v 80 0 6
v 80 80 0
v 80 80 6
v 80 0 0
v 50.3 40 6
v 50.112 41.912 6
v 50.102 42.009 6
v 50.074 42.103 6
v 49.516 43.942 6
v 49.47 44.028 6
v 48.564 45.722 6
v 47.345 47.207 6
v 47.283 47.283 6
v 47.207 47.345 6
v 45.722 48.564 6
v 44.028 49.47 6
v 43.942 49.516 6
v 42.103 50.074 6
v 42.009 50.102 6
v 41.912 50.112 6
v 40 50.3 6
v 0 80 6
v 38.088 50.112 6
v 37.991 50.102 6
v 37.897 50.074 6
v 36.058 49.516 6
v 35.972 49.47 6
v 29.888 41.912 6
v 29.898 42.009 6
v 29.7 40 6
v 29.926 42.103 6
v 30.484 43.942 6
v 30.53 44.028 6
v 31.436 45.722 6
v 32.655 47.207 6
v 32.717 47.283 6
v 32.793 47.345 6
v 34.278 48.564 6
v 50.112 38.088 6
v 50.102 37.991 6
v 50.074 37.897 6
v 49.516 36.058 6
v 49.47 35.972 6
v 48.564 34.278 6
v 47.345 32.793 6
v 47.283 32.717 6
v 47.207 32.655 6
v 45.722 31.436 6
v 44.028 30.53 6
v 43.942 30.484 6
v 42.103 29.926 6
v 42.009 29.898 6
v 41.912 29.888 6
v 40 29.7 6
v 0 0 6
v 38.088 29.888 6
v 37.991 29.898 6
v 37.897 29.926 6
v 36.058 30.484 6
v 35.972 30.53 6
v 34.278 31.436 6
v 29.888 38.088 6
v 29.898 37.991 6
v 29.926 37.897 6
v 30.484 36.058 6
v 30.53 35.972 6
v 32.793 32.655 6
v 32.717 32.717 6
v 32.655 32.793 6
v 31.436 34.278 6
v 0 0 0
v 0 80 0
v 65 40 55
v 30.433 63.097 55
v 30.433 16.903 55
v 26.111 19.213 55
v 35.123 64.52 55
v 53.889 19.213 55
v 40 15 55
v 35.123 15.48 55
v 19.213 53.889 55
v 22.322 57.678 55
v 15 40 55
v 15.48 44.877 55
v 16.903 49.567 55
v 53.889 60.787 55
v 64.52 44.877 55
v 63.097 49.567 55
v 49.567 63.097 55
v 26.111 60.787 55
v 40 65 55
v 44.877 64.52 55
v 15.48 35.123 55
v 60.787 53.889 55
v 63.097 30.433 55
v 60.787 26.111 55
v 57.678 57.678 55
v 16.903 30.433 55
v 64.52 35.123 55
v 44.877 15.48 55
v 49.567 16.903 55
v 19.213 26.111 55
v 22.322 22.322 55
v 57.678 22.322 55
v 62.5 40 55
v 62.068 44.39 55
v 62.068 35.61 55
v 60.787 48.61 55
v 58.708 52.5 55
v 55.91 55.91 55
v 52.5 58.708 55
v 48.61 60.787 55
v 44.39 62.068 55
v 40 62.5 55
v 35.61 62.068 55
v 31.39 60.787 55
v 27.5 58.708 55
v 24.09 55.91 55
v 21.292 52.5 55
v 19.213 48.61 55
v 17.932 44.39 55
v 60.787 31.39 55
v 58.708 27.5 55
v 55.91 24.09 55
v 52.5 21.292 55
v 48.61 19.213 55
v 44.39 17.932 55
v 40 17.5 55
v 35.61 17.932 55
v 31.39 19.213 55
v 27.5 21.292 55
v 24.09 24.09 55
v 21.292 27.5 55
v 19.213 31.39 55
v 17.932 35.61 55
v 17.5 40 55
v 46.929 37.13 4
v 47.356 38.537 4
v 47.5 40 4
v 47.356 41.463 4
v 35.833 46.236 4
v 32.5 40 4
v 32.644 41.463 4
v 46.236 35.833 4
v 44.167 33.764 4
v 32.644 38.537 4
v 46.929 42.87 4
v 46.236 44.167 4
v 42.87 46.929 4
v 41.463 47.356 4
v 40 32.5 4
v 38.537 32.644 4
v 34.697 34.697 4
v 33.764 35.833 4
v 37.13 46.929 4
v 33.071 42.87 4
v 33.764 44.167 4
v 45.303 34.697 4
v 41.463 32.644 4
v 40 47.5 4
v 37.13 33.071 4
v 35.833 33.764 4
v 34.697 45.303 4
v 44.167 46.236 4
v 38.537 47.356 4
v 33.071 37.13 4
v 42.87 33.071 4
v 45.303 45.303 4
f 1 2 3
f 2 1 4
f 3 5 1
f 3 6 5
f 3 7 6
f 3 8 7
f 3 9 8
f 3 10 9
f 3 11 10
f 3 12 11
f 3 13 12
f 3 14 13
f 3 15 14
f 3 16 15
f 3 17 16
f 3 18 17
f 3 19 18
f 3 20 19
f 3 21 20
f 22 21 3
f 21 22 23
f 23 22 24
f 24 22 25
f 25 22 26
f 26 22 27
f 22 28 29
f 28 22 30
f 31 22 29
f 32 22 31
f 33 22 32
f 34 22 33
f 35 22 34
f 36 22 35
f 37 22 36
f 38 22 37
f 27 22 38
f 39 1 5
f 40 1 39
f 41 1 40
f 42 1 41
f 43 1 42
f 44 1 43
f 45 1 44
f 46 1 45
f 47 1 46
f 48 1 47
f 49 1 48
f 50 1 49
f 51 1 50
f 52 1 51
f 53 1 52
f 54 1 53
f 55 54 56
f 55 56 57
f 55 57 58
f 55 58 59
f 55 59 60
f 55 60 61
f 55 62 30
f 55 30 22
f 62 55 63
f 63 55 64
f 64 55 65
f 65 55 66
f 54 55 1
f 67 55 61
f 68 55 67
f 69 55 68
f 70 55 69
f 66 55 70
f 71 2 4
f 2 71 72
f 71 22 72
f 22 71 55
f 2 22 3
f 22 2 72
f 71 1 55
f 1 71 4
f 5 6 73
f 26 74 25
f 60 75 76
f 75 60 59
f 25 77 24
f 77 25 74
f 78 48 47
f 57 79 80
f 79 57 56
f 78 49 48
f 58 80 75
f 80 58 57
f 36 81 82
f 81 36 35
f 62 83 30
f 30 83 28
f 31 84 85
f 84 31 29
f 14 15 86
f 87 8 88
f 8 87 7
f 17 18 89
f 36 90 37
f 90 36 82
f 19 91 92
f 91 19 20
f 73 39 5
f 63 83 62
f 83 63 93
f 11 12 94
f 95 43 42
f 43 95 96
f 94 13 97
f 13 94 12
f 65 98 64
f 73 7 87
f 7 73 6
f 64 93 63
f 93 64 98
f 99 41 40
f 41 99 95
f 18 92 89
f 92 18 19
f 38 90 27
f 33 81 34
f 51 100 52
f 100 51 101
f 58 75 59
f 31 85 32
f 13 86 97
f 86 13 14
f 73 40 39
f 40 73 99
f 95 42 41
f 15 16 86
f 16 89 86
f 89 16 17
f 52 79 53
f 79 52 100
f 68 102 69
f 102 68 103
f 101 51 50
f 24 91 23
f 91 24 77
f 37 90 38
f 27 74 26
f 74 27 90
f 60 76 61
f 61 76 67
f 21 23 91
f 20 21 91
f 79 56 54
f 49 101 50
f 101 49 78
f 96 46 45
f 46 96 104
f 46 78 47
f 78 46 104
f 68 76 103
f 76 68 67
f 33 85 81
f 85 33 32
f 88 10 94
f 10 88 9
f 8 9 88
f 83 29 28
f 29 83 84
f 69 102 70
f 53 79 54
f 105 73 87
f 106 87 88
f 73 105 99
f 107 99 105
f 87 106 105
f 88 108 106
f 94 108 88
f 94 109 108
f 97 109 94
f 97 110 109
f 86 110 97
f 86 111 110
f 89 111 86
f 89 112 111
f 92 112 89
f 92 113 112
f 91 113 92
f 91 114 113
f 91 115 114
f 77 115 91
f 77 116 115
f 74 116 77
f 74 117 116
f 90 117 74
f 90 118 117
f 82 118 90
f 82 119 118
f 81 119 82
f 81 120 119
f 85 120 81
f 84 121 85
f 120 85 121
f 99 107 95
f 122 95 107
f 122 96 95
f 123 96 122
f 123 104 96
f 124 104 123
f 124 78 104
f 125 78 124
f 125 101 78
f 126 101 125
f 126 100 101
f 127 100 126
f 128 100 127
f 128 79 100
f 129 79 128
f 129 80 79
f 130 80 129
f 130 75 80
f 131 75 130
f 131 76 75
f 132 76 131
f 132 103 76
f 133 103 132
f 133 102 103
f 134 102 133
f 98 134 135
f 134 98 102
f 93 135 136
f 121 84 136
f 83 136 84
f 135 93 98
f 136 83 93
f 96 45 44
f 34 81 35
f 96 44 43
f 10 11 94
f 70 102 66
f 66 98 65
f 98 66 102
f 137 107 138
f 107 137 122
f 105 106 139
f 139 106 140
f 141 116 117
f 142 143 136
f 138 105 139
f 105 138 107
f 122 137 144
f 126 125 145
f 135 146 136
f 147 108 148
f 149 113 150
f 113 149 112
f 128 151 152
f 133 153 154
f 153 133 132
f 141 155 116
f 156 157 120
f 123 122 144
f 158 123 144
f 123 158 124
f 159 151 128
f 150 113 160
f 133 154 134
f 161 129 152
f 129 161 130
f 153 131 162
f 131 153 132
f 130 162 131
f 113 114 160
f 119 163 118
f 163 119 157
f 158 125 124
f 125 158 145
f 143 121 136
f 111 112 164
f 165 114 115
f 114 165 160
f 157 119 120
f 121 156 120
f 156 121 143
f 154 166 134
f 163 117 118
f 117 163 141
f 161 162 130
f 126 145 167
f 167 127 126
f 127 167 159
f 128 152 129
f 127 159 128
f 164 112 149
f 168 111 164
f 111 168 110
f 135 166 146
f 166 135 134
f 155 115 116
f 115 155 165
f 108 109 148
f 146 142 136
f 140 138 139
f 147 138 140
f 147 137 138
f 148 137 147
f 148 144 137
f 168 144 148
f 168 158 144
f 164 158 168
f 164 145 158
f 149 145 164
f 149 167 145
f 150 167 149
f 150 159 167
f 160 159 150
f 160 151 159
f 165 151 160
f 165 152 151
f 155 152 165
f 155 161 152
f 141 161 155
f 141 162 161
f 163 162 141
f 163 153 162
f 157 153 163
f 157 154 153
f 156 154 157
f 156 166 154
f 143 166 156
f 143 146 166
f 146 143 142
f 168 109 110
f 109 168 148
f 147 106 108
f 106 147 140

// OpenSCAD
$fn = 32;

// ----------------------------------------------------------------------
// Hopper: funnel with square flange
// ----------------------------------------------------------------------

// --- parameters (mm) ---
fl = 80;                  // flange side, X and Y
fl_t = 6;                 // flange thickness
cone_h = 50;              // cone height above the flange
top_d = 50;               // cone mouth diameter
bot_d = 20;               // cone spout diameter
wall = 2.5;               // cone wall thickness

bore_d = bot_d - 2 * wall;  // spout bore diameter
total_h = fl_t + cone_h - 1;  // overall height

difference() {
  union() {
    cube([fl, fl, fl_t]);
    translate([fl / 2, fl / 2, fl_t - 1])
      cylinder(h = cone_h, d1 = bot_d, d2 = top_d);
  }
  translate([fl / 2, fl / 2, fl_t - 2])
    cylinder(h = cone_h + 1, d1 = bore_d, d2 = top_d - 2 * wall);
}
